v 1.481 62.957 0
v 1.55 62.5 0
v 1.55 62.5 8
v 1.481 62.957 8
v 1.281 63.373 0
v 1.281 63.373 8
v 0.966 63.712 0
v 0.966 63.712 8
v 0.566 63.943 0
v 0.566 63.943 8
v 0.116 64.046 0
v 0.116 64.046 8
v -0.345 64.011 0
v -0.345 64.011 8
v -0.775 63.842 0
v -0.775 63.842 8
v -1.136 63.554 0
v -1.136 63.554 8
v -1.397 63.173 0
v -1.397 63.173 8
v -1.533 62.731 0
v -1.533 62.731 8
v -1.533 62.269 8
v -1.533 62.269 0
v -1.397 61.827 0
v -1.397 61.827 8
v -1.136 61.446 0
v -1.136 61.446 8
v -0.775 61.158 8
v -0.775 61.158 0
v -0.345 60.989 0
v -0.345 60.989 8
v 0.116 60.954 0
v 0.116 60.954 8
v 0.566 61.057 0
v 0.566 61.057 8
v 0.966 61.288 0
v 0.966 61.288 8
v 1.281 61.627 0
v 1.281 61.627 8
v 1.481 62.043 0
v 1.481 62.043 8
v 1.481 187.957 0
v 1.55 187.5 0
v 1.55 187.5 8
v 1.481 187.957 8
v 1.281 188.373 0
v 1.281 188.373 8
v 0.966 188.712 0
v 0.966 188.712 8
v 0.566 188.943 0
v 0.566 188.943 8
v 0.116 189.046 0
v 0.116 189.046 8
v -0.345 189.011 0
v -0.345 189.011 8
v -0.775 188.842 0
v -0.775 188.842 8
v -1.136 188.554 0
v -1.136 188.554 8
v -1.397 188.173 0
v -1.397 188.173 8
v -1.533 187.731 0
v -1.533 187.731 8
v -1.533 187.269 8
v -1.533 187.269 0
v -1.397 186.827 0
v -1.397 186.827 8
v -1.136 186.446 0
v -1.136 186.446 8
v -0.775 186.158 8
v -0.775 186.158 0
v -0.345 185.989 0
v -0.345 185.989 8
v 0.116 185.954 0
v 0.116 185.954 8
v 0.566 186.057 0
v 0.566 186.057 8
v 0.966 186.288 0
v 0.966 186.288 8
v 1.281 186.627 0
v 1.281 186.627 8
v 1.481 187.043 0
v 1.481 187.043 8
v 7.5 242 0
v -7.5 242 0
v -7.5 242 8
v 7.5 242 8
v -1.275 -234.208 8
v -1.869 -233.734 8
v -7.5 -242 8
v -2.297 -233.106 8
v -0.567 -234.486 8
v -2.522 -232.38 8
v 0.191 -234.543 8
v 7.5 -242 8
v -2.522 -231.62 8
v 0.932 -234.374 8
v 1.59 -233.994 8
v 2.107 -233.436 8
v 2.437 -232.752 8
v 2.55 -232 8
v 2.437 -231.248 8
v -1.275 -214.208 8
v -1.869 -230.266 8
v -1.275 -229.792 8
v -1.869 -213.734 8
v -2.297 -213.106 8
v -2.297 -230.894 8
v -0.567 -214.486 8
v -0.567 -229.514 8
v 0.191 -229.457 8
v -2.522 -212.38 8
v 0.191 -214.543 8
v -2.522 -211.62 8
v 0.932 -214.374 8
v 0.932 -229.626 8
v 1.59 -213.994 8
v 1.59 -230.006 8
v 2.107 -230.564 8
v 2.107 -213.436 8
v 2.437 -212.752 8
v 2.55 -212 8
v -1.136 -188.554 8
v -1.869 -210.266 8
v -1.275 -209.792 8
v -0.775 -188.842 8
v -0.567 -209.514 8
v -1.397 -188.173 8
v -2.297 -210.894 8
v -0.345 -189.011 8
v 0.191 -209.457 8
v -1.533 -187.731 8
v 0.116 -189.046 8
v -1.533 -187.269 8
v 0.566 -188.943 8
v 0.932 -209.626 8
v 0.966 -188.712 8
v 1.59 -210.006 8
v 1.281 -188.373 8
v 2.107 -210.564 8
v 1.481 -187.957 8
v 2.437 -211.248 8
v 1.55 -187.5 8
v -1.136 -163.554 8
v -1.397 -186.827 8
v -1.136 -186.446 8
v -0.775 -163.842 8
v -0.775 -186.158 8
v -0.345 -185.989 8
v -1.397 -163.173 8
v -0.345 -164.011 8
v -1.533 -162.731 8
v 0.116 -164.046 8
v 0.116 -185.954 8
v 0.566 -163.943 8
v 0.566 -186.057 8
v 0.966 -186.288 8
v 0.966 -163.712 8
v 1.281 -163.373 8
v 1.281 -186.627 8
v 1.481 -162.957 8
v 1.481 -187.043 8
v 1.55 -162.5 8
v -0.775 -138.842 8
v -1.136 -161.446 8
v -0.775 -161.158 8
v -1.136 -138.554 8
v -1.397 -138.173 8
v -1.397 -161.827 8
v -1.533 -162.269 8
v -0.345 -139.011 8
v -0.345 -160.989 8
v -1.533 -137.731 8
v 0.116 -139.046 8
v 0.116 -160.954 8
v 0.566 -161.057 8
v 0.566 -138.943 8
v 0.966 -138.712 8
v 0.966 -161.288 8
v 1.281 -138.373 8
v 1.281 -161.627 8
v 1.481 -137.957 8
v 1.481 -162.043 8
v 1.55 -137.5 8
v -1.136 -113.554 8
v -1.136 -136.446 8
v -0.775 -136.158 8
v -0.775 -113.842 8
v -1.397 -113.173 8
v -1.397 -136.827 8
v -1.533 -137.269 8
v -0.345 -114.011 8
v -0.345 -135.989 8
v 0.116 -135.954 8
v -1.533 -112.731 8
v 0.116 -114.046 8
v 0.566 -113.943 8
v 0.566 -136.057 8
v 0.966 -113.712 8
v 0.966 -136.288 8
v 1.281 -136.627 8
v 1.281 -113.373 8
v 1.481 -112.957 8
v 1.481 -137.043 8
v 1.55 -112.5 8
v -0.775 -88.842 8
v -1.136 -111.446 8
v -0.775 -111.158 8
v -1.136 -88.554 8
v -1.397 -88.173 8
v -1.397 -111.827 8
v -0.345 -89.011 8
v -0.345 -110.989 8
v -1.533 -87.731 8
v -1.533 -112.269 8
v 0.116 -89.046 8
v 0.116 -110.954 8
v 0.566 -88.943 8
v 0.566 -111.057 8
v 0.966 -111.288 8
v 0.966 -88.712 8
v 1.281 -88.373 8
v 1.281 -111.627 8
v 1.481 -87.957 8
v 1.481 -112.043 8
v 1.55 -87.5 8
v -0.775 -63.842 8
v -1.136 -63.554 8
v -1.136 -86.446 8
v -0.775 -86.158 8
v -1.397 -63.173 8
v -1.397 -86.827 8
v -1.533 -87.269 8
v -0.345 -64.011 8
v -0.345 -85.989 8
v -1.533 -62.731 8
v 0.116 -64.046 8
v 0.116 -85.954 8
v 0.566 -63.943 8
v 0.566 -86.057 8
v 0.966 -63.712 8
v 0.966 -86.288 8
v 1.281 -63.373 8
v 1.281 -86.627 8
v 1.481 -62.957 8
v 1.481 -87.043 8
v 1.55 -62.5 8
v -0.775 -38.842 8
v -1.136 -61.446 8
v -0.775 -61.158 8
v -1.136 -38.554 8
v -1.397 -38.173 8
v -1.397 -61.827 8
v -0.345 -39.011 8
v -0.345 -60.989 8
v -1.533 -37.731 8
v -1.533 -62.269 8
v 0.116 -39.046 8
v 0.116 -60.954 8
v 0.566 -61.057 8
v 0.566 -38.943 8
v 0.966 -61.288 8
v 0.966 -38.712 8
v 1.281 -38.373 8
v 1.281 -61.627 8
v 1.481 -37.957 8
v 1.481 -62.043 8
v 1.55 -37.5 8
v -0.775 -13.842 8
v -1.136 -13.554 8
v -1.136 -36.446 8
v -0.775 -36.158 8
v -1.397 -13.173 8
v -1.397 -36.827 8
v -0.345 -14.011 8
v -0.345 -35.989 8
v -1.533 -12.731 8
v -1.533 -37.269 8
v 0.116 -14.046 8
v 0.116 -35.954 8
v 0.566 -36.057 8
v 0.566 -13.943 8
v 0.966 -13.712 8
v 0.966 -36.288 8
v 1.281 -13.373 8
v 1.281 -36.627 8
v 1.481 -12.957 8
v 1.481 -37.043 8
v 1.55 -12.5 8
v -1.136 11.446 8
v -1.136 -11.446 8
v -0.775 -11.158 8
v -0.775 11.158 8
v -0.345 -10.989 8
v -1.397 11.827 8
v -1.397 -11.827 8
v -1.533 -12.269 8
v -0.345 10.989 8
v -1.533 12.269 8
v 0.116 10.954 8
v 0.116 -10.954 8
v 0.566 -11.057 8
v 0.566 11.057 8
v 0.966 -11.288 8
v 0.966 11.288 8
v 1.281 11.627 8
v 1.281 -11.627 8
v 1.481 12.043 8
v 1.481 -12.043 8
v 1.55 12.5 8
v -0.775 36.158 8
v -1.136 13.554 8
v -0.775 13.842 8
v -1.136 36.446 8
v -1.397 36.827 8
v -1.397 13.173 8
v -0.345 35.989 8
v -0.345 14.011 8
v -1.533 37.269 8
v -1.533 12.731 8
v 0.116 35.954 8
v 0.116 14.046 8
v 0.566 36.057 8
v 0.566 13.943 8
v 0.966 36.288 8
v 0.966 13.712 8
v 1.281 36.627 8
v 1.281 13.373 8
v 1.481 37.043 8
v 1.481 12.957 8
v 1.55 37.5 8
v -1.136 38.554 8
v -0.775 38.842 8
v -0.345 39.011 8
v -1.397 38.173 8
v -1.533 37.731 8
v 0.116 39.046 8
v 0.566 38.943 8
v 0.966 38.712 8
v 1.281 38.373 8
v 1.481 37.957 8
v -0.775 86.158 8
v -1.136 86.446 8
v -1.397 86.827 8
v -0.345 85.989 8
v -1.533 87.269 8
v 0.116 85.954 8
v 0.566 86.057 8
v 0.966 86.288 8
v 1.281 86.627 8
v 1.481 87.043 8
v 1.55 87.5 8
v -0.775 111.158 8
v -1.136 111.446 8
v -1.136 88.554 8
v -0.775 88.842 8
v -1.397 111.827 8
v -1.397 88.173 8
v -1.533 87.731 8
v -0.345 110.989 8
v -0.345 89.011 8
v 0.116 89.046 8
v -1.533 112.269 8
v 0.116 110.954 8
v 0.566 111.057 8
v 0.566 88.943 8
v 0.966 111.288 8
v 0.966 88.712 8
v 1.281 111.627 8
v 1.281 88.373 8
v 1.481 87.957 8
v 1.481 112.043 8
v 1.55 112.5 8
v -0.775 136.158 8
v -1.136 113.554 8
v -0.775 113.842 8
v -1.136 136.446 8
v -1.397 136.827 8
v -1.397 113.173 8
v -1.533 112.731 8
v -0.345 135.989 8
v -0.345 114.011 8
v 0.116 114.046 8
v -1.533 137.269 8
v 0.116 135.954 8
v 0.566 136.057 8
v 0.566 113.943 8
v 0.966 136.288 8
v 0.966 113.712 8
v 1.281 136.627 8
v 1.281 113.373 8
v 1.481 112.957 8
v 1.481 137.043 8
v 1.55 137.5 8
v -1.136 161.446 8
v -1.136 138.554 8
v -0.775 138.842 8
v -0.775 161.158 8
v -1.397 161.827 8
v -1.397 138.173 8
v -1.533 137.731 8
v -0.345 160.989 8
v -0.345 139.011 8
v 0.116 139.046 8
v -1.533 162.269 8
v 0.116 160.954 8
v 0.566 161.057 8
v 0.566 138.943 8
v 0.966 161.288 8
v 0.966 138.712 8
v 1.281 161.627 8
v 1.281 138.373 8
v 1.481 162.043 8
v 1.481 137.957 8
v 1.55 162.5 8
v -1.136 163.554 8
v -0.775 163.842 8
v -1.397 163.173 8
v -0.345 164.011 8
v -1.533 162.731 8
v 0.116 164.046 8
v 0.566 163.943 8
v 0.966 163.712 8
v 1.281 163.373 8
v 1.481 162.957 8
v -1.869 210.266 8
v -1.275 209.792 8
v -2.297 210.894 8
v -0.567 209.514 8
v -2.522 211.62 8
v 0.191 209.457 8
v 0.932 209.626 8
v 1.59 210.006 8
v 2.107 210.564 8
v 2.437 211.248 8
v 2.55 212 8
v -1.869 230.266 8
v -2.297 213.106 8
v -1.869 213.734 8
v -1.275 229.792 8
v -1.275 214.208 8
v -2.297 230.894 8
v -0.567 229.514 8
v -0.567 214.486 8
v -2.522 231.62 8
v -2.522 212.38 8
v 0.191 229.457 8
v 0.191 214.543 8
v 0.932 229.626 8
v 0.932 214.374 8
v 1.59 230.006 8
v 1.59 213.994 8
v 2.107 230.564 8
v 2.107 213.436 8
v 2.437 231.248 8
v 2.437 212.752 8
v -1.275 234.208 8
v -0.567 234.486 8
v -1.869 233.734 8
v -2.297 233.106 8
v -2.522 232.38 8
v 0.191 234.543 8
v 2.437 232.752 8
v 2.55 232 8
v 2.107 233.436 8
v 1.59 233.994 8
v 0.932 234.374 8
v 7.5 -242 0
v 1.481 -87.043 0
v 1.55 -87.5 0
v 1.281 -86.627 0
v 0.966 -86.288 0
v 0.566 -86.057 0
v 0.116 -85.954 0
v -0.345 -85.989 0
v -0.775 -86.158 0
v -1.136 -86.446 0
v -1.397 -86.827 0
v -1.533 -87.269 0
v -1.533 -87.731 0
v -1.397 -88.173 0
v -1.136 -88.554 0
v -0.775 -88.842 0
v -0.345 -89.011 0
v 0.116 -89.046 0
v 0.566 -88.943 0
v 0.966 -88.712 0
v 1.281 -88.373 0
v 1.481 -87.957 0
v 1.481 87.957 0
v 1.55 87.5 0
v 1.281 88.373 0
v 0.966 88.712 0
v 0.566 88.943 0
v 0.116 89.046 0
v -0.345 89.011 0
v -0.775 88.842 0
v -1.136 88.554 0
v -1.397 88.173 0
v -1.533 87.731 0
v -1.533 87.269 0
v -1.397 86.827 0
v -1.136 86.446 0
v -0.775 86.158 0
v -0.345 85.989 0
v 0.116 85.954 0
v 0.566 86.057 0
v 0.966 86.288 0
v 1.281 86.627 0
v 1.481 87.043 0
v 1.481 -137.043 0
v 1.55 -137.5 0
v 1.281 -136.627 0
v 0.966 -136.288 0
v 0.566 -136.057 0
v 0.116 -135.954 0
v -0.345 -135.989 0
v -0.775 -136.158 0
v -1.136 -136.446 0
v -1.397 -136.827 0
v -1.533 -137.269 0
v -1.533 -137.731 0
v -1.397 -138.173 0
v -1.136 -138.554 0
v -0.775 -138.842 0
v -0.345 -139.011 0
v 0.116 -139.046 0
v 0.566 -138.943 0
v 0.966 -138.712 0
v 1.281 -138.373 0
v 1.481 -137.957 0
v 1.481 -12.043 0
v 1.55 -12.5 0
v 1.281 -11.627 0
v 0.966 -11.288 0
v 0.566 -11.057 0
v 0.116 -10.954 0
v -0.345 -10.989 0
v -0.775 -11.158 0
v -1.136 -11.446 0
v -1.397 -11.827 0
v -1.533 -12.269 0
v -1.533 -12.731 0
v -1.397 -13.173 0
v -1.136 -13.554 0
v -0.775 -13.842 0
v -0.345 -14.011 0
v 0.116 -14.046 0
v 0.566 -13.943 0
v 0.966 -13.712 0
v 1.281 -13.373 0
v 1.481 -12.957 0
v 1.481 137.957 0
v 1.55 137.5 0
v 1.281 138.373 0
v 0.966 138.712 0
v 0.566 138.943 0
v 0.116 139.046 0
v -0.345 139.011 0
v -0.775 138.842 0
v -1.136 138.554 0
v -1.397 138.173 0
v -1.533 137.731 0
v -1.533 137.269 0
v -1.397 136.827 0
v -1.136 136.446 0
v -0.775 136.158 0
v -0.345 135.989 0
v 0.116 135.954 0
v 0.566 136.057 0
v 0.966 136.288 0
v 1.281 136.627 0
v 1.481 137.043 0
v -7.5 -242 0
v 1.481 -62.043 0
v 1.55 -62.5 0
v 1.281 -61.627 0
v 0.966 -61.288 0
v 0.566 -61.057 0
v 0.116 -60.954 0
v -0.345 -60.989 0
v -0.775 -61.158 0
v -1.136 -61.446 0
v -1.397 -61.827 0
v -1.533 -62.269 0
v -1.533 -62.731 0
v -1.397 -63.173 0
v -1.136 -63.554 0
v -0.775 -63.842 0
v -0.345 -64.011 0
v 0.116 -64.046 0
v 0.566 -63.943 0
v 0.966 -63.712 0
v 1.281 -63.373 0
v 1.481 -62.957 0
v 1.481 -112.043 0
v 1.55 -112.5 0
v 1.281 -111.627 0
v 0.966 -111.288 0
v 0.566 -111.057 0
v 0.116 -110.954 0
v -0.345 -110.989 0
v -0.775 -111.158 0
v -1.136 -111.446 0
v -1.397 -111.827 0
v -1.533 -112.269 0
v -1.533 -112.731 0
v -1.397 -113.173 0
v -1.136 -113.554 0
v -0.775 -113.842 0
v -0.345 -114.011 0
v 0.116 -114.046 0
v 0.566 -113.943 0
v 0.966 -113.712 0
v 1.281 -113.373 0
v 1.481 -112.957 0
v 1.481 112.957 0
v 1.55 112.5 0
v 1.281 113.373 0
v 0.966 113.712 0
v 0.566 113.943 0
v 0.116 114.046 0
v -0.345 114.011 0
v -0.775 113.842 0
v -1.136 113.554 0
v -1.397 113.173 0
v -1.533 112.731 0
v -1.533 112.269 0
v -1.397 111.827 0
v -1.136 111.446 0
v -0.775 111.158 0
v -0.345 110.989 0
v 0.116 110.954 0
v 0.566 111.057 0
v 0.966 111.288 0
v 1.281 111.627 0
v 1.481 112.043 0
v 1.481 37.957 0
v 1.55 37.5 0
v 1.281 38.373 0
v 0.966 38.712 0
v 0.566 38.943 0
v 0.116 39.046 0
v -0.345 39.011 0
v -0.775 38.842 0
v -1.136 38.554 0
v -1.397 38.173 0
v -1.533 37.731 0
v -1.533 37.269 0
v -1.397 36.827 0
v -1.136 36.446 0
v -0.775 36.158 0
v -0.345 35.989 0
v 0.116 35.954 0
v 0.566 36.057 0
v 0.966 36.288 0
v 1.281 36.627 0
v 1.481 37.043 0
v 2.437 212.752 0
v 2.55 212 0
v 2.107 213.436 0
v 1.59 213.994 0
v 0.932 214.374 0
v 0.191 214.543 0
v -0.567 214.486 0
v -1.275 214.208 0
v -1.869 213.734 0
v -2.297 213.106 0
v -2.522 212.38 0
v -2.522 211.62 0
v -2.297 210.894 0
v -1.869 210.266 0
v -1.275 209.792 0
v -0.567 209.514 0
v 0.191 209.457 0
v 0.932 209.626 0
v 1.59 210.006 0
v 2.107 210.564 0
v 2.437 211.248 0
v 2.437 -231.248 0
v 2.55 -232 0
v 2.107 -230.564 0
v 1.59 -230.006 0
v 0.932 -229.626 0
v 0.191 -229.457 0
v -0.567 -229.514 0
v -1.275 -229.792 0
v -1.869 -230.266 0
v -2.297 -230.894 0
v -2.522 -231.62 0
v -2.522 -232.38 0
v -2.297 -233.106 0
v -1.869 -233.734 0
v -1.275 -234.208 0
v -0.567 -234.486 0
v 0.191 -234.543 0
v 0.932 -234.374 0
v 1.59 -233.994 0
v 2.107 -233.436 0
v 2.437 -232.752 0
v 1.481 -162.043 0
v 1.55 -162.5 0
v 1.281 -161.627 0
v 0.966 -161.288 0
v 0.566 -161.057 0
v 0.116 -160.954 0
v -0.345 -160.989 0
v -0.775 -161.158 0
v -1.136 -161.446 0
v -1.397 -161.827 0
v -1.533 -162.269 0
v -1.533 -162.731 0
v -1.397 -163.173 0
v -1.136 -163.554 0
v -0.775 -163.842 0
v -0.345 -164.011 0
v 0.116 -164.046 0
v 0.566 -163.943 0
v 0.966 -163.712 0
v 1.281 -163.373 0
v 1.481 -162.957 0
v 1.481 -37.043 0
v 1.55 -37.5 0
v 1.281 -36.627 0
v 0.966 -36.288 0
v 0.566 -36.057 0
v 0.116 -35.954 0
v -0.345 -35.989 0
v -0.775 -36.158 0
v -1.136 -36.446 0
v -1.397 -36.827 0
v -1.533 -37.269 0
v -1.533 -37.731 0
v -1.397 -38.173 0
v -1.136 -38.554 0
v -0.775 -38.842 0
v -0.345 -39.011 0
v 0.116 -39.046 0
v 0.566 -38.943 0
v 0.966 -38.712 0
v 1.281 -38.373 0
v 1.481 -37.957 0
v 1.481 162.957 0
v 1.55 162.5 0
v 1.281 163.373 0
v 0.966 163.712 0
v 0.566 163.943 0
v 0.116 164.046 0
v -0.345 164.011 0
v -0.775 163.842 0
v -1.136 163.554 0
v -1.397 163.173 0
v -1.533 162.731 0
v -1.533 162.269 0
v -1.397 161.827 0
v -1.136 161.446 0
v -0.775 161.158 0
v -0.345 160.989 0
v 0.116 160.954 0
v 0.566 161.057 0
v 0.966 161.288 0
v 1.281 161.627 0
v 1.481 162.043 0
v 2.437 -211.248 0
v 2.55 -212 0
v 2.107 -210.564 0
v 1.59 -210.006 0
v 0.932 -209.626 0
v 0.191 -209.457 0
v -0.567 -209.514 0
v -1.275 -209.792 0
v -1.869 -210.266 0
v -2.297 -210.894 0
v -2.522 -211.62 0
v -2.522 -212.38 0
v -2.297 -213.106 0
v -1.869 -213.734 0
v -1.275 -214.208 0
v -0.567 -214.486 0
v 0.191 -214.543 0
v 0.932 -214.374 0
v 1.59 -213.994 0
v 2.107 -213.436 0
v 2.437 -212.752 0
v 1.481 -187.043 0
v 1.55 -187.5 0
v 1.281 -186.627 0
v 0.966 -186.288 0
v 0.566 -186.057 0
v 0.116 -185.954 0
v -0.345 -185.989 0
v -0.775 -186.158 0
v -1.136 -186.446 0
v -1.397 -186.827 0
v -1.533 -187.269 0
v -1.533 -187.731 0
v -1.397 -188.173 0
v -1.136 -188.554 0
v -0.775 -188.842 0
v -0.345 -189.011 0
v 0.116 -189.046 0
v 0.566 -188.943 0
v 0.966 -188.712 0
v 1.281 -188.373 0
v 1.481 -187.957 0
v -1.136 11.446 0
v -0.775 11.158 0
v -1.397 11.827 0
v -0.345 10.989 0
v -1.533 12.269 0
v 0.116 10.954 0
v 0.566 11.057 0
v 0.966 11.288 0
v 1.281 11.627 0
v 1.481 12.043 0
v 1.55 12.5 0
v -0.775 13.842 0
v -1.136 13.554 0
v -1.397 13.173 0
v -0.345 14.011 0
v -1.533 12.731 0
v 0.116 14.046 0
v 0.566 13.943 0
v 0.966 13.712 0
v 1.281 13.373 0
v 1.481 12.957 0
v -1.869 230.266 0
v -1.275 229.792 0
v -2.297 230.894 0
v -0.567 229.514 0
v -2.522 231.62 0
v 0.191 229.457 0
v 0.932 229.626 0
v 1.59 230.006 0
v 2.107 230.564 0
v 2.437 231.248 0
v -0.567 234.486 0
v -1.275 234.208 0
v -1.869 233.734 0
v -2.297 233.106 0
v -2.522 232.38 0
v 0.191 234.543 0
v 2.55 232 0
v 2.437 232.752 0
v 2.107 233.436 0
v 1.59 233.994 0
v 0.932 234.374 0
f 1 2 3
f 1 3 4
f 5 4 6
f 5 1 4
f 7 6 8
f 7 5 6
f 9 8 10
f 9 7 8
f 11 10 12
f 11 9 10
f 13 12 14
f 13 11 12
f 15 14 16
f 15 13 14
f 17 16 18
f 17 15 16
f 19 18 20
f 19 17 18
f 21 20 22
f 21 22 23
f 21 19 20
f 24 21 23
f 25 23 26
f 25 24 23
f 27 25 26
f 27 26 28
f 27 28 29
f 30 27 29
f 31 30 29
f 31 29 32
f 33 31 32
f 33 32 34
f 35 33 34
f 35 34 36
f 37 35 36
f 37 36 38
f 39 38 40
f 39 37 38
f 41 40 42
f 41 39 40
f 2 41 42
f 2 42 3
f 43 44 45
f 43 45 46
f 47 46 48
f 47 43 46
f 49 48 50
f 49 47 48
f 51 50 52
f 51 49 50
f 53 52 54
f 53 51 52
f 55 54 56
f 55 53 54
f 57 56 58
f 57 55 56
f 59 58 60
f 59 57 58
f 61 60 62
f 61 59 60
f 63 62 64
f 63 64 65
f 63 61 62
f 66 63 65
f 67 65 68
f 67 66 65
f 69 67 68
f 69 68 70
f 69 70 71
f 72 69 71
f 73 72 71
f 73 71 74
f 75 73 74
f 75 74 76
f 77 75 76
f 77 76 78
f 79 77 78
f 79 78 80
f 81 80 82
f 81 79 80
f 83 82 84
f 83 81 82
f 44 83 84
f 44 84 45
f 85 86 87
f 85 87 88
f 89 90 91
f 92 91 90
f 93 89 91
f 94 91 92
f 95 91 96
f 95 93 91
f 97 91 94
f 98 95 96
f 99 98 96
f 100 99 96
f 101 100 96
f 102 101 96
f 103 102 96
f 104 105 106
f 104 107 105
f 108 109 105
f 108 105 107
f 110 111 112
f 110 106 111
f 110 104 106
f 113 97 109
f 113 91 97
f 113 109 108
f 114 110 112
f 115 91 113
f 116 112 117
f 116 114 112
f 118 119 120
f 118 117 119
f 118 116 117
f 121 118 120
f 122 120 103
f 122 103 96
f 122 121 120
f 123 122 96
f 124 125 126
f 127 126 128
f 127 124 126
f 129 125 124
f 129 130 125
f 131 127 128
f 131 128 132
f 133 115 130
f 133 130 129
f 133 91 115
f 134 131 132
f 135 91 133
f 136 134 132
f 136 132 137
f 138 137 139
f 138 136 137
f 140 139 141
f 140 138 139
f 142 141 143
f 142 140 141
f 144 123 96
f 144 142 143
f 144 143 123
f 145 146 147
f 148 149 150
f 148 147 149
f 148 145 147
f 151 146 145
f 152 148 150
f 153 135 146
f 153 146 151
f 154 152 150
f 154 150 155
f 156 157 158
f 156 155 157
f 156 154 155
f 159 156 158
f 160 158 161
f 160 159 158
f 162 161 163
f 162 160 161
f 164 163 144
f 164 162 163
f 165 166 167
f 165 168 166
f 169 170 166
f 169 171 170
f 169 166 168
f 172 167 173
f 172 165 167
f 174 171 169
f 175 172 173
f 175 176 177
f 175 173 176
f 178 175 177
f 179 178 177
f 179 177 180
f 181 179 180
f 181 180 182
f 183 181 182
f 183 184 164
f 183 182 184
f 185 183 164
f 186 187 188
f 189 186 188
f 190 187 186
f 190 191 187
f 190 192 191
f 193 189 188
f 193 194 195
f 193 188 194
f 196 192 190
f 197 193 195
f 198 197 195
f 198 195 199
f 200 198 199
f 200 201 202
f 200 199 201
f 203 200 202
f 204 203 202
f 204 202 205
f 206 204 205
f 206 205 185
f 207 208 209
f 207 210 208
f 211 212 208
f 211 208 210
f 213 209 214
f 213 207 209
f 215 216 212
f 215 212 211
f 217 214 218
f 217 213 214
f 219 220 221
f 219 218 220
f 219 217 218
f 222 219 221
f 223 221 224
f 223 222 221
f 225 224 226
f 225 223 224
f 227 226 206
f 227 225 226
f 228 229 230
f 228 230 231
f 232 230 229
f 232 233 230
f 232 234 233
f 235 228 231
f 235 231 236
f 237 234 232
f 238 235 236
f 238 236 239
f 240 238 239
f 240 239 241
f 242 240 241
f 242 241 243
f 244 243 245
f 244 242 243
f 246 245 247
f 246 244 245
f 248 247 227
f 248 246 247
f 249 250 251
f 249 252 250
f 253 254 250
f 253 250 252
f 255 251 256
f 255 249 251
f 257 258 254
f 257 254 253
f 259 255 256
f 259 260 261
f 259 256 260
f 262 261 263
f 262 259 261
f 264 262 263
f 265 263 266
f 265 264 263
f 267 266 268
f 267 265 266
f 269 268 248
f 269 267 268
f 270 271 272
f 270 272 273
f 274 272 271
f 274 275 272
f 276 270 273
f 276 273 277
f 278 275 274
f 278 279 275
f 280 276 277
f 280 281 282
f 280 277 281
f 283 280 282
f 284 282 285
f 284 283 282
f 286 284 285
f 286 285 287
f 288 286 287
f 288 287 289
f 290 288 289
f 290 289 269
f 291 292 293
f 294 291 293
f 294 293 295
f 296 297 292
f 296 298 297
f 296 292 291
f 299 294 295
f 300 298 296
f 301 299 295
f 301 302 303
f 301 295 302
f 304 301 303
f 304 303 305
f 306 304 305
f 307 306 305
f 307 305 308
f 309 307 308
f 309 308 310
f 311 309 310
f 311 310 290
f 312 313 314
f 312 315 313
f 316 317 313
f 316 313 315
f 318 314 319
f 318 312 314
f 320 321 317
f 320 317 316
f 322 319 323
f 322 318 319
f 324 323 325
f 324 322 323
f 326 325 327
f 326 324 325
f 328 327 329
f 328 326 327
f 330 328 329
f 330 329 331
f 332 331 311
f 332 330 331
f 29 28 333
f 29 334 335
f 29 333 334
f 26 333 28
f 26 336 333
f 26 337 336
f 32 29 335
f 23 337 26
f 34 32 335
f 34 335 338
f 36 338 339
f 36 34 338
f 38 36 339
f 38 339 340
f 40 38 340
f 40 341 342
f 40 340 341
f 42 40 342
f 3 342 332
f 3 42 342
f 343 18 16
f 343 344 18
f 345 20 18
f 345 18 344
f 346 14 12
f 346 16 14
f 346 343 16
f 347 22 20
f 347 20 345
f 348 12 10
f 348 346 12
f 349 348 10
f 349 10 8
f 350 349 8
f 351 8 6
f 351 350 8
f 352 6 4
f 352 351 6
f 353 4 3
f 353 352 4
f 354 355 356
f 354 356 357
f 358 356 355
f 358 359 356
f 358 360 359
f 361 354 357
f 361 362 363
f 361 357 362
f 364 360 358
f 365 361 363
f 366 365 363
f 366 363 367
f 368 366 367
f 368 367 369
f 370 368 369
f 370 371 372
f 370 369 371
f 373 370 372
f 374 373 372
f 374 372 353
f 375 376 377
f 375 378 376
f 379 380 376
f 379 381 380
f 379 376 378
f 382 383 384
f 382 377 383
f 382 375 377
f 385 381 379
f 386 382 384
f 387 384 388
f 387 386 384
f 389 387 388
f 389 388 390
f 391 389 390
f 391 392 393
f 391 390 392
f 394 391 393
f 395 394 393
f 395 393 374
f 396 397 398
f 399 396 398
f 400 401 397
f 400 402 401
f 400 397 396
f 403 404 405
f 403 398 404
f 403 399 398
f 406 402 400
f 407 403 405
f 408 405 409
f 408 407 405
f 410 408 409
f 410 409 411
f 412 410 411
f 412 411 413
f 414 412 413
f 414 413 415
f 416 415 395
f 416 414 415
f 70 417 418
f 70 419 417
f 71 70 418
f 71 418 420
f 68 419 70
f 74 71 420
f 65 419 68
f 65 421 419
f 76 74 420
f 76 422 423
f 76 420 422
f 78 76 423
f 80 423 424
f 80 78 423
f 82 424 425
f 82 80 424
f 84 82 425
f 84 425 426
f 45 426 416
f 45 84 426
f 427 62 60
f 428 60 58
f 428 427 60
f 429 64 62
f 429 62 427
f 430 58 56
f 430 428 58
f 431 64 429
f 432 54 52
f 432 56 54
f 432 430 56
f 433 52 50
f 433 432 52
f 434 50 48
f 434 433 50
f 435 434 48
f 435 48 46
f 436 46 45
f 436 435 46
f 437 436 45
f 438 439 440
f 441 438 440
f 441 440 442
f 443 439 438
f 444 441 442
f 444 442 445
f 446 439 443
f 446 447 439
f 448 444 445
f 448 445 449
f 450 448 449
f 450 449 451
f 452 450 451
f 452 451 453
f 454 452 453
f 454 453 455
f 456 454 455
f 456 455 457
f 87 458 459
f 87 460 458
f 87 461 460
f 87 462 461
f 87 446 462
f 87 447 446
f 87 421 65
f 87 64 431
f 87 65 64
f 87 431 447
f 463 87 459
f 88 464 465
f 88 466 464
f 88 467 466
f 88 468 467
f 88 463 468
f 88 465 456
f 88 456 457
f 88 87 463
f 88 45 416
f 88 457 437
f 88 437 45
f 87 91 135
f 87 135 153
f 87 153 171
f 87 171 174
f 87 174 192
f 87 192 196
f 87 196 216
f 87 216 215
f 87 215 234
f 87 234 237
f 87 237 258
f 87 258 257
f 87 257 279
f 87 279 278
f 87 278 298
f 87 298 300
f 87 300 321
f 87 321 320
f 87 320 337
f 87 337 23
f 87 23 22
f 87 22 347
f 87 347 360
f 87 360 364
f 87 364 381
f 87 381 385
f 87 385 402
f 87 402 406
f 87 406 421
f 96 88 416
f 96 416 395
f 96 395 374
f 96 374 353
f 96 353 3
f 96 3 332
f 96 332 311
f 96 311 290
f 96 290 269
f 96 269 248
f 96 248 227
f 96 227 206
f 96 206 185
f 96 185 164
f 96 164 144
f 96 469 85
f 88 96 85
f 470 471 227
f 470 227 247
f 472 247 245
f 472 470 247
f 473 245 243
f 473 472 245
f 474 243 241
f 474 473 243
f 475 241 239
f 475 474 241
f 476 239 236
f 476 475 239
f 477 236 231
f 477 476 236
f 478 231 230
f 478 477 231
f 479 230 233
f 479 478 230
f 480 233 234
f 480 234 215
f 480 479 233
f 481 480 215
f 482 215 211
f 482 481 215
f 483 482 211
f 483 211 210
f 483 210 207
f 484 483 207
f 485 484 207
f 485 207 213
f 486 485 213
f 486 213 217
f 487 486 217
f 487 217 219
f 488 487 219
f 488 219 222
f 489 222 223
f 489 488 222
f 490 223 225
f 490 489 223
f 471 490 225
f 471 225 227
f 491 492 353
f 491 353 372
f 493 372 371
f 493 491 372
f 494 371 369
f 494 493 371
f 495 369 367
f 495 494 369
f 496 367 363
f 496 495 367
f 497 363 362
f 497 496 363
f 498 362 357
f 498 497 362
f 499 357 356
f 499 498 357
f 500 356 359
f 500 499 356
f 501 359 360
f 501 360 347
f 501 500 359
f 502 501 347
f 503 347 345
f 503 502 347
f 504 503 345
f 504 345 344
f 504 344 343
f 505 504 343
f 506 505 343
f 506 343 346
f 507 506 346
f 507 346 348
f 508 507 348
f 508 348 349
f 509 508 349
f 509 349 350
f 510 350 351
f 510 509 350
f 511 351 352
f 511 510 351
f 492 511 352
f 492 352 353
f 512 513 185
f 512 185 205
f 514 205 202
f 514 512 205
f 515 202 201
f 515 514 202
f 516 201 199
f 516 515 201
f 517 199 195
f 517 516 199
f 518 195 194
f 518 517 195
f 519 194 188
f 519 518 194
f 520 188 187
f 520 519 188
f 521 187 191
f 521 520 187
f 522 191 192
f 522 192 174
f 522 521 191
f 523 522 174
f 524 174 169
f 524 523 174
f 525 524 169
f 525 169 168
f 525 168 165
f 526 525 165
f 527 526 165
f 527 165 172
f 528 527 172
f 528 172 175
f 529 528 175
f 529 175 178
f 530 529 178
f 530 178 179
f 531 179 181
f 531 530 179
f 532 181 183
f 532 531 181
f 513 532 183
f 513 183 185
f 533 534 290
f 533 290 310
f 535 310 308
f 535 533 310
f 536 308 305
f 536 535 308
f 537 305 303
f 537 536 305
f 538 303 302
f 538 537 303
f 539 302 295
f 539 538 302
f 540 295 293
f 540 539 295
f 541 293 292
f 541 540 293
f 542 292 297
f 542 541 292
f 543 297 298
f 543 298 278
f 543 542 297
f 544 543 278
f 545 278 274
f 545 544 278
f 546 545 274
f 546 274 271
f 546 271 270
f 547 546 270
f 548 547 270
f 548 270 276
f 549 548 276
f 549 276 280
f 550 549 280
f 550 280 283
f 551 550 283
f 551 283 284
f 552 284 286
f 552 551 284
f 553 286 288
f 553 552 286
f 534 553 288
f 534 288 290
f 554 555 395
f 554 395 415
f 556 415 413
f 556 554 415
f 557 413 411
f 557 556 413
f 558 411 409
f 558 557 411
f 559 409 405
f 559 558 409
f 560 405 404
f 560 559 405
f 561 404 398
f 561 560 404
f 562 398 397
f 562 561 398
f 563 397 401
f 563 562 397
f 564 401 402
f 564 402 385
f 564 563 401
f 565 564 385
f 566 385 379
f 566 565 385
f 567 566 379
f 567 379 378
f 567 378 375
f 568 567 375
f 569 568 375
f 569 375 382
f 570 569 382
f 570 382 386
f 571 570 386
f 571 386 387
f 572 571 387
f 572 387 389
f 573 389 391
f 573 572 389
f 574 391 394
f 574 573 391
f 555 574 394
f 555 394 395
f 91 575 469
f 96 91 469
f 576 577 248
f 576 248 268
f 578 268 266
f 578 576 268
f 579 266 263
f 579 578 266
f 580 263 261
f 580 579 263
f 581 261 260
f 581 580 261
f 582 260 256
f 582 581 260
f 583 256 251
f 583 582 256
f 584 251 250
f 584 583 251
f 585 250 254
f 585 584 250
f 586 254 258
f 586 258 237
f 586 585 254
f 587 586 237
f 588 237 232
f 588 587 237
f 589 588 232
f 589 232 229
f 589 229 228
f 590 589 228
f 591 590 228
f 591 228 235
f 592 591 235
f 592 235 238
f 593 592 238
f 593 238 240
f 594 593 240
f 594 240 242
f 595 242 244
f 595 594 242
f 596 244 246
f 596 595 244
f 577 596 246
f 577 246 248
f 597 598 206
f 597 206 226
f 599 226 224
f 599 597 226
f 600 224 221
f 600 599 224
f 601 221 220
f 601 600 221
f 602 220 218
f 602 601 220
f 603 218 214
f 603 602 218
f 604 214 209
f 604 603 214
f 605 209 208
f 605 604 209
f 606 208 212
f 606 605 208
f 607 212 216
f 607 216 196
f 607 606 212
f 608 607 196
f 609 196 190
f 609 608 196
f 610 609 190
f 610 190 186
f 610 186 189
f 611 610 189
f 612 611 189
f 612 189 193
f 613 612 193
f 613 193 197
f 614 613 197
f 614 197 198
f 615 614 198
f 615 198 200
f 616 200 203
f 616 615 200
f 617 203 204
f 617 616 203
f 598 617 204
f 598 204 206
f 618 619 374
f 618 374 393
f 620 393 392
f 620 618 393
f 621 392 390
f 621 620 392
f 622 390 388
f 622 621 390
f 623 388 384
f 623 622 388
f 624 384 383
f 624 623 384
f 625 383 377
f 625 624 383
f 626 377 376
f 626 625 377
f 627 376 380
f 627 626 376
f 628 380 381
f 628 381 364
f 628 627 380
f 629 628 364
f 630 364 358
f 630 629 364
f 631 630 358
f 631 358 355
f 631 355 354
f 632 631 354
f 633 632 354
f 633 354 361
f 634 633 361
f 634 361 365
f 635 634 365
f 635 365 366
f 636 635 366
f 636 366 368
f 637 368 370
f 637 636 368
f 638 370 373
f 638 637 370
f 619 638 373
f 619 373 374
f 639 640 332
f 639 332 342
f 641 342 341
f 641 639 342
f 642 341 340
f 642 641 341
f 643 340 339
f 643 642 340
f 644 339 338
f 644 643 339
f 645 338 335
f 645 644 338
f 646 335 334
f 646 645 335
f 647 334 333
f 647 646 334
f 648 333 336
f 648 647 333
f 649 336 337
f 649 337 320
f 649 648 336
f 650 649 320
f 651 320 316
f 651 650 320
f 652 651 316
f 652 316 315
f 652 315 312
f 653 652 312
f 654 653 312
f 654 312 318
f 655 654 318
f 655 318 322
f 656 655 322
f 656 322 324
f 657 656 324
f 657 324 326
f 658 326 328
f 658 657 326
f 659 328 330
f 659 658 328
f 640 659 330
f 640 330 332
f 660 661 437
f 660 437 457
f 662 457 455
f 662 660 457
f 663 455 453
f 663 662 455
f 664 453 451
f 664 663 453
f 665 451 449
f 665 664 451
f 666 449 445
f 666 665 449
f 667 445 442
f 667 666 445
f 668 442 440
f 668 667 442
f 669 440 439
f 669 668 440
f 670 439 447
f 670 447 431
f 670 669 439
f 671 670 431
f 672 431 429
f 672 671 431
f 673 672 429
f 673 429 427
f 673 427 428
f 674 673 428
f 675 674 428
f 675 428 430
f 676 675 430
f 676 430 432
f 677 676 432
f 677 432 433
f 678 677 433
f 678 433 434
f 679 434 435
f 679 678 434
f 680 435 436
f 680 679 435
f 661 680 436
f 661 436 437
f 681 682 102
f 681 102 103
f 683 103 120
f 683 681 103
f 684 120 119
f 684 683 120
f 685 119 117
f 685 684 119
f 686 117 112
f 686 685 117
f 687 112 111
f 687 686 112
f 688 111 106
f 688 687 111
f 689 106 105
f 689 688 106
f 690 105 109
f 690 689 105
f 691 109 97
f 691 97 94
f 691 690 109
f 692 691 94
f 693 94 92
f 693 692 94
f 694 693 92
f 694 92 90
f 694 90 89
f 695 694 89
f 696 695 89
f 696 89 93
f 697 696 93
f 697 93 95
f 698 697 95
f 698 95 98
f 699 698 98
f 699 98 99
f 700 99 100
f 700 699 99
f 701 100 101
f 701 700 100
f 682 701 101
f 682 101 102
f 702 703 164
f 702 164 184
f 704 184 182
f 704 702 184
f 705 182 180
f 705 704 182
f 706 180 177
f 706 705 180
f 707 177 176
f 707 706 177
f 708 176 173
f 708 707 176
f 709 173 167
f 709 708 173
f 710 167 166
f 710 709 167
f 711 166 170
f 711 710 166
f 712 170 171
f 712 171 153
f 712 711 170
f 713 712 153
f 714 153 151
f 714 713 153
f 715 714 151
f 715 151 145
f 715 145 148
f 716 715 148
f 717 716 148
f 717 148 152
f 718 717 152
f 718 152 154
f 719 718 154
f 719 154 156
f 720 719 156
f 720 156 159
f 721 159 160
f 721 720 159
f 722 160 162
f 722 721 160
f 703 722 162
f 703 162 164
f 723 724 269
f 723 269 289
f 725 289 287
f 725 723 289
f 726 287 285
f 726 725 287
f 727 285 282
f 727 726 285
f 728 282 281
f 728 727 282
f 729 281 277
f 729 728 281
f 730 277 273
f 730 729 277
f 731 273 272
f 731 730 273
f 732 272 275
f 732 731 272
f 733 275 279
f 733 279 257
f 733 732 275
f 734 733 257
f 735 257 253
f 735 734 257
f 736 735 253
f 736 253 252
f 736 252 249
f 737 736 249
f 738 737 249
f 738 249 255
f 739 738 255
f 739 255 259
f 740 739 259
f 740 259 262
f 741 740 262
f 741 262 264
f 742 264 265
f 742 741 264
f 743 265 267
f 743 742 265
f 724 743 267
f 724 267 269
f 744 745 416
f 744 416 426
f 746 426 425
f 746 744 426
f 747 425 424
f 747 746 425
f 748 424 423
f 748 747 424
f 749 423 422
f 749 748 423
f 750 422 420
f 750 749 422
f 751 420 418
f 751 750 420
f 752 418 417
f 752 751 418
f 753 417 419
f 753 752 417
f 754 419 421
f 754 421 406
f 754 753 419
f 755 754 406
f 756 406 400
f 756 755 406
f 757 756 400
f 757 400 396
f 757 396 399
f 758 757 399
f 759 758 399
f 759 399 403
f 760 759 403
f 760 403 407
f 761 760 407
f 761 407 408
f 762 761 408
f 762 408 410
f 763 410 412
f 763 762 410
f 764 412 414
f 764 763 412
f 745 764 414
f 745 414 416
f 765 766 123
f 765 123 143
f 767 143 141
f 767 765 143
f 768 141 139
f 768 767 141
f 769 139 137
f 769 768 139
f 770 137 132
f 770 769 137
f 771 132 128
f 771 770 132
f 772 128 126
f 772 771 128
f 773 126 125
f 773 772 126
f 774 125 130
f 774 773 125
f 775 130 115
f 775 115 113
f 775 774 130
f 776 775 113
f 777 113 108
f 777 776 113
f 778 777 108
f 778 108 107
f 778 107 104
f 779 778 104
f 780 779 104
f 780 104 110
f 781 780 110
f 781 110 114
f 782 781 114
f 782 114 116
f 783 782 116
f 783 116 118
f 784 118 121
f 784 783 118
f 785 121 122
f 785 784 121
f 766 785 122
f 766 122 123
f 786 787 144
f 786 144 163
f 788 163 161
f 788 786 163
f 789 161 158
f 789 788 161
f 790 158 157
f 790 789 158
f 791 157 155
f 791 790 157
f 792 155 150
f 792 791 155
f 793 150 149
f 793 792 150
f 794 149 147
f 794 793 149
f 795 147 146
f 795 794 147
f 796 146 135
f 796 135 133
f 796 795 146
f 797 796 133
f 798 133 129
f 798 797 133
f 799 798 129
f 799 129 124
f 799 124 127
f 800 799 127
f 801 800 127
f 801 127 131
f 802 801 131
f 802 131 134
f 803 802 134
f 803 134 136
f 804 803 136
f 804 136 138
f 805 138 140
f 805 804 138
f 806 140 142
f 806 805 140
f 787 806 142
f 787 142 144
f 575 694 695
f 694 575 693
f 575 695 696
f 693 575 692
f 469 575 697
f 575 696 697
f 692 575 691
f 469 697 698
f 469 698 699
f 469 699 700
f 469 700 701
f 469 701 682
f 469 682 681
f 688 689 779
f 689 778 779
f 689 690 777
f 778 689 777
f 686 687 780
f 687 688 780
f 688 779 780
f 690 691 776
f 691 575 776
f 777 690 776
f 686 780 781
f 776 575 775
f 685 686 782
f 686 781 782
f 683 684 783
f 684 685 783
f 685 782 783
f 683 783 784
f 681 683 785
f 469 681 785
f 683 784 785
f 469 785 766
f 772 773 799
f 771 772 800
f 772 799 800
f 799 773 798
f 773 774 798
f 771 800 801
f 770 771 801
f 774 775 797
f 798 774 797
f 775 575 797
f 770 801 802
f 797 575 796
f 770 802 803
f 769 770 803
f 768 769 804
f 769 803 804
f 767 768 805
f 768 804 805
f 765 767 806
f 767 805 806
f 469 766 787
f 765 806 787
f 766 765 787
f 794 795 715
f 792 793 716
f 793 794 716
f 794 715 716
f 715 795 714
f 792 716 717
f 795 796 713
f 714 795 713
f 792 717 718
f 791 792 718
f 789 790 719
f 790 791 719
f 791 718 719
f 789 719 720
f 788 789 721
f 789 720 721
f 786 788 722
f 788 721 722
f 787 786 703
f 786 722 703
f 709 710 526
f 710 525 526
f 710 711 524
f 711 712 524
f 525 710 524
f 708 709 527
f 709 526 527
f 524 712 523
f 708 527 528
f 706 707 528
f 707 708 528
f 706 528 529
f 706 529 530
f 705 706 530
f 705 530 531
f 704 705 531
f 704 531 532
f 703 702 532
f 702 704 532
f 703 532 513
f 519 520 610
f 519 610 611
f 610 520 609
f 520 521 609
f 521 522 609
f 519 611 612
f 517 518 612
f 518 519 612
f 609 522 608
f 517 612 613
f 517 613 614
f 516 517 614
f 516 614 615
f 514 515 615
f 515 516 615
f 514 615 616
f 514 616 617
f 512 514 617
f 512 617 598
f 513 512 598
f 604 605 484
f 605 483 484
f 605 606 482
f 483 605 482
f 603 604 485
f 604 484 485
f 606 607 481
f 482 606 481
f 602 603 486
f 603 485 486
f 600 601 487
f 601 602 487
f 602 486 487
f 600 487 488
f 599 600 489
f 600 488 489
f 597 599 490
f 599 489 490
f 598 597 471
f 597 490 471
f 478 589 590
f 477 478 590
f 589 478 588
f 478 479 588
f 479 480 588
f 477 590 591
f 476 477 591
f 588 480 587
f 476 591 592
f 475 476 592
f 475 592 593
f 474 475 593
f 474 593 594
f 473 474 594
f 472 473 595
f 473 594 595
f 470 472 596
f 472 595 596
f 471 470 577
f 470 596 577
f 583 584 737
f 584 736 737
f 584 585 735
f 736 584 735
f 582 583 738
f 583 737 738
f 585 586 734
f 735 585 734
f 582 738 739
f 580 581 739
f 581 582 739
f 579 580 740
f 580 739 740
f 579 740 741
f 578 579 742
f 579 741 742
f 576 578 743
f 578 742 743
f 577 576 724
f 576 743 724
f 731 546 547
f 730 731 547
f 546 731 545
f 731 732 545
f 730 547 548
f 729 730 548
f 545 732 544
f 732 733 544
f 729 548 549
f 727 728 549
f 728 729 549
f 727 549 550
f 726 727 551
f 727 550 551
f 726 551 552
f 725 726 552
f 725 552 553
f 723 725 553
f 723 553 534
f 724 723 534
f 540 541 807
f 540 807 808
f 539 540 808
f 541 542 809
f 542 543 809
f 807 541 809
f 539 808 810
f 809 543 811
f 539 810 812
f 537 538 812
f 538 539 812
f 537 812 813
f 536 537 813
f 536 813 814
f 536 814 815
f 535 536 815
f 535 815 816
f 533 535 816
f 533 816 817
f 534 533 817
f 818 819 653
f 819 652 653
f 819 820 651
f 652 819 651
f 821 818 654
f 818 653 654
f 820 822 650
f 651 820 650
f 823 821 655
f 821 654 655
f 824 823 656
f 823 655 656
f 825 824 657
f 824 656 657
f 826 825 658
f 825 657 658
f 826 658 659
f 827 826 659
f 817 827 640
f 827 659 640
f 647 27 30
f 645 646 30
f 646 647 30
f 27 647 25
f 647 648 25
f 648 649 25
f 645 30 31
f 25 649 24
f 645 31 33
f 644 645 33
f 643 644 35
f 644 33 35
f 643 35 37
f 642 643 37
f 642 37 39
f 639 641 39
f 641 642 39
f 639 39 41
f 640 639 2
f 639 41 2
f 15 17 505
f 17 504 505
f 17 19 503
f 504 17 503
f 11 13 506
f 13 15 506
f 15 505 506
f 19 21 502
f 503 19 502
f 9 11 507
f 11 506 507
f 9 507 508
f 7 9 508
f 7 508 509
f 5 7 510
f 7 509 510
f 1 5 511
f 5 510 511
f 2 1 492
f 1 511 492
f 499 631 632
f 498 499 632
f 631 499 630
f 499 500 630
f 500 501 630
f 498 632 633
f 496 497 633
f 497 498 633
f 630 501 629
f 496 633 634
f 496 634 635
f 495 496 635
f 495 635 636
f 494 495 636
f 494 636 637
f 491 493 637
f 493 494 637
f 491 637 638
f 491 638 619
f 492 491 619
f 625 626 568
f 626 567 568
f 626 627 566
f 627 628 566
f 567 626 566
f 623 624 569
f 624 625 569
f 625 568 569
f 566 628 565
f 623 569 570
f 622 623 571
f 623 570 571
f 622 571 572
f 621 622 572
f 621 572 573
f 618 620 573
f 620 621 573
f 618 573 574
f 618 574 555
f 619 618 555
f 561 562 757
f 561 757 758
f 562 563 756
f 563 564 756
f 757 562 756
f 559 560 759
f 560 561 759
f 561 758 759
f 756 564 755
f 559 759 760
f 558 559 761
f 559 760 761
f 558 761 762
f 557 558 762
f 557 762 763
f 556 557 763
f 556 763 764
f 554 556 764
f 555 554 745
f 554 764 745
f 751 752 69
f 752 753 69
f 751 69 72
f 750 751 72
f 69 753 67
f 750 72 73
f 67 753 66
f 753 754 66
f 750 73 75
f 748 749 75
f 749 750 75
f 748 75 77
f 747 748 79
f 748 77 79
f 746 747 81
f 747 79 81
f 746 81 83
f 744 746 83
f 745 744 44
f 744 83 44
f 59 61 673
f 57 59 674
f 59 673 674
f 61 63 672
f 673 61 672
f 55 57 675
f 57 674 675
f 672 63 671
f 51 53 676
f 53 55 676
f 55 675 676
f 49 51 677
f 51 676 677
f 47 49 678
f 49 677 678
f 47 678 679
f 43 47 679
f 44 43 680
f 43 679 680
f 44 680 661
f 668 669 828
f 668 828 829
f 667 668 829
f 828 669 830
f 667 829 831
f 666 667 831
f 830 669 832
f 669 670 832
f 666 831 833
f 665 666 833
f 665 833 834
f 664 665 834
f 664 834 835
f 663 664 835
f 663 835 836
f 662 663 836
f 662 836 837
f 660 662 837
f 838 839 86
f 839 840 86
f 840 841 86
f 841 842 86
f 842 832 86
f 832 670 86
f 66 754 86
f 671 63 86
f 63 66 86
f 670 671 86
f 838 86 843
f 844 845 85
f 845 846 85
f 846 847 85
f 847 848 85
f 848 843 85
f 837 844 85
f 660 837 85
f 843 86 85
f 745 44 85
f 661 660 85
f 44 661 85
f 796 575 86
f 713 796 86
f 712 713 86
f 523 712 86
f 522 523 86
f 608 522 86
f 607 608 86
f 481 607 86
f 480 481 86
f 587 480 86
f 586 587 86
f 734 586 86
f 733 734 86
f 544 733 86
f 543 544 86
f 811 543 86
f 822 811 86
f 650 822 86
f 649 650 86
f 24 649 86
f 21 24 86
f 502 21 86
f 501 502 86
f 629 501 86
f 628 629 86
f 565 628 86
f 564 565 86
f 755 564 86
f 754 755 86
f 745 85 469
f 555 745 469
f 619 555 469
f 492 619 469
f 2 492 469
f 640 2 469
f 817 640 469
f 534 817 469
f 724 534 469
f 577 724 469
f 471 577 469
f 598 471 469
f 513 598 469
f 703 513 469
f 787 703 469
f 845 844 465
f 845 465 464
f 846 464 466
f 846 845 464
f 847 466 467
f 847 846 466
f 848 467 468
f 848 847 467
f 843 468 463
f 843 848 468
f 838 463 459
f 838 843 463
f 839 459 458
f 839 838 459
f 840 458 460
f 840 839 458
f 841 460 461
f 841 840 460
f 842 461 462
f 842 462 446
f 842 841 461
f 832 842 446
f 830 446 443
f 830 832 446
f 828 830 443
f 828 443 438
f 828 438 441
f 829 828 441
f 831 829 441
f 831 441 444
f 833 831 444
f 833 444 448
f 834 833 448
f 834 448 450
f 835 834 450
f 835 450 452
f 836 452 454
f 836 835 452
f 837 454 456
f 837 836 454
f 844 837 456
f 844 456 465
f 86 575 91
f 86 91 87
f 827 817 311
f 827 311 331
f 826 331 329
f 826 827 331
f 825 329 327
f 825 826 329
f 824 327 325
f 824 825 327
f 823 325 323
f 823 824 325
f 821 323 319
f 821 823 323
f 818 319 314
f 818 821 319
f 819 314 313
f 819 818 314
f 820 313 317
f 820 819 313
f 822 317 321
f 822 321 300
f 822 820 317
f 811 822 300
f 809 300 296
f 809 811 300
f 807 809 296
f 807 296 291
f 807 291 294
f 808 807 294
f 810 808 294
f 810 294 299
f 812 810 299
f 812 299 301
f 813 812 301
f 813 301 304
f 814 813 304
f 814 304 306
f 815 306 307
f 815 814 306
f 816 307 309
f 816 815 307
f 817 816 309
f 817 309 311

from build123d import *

# Parameters (mm, degrees)
F0_W     = 15
F0_H     = 484
F0_R     = 2.55
F0_R_2   = 1.55
F1_DEPTH = 8


with BuildPart() as f1:
    # F0 (on Top) → F1 (new body)
    with BuildSketch(Plane.XY):
        Rectangle(F0_W, F0_H)
        with Locations((0, -232)):
            Circle(F0_R, mode=Mode.SUBTRACT)
        with Locations((0, -212)):
            Circle(F0_R, mode=Mode.SUBTRACT)
        with Locations((0, -187.5)):
            Circle(F0_R_2, mode=Mode.SUBTRACT)
        with Locations((0, -162.5)):
            Circle(F0_R_2, mode=Mode.SUBTRACT)
        with Locations((0, -137.5)):
            Circle(F0_R_2, mode=Mode.SUBTRACT)
        with Locations((0, -112.5)):
            Circle(F0_R_2, mode=Mode.SUBTRACT)
        with Locations((0, -87.5)):
            Circle(F0_R_2, mode=Mode.SUBTRACT)
        with Locations((0, -62.5)):
            Circle(F0_R_2, mode=Mode.SUBTRACT)
        with Locations((0, -37.5)):
            Circle(F0_R_2, mode=Mode.SUBTRACT)
        with Locations((0, -12.5)):
            Circle(F0_R_2, mode=Mode.SUBTRACT)
        with Locations((0, 12.5)):
            Circle(F0_R_2, mode=Mode.SUBTRACT)
        with Locations((0, 37.5)):
            Circle(F0_R_2, mode=Mode.SUBTRACT)
        with Locations((0, 62.5)):
            Circle(F0_R_2, mode=Mode.SUBTRACT)
        with Locations((0, 87.5)):
            Circle(F0_R_2, mode=Mode.SUBTRACT)
        with Locations((0, 112.5)):
            Circle(F0_R_2, mode=Mode.SUBTRACT)
        with Locations((0, 137.5)):
            Circle(F0_R_2, mode=Mode.SUBTRACT)
        with Locations((0, 162.5)):
            Circle(F0_R_2, mode=Mode.SUBTRACT)
        with Locations((0, 187.5)):
            Circle(F0_R_2, mode=Mode.SUBTRACT)
        with Locations((0, 212)):
            Circle(F0_R, mode=Mode.SUBTRACT)
        with Locations((0, 232)):
            Circle(F0_R, mode=Mode.SUBTRACT)
    extrude(amount=F1_DEPTH)


solid = f1.part
